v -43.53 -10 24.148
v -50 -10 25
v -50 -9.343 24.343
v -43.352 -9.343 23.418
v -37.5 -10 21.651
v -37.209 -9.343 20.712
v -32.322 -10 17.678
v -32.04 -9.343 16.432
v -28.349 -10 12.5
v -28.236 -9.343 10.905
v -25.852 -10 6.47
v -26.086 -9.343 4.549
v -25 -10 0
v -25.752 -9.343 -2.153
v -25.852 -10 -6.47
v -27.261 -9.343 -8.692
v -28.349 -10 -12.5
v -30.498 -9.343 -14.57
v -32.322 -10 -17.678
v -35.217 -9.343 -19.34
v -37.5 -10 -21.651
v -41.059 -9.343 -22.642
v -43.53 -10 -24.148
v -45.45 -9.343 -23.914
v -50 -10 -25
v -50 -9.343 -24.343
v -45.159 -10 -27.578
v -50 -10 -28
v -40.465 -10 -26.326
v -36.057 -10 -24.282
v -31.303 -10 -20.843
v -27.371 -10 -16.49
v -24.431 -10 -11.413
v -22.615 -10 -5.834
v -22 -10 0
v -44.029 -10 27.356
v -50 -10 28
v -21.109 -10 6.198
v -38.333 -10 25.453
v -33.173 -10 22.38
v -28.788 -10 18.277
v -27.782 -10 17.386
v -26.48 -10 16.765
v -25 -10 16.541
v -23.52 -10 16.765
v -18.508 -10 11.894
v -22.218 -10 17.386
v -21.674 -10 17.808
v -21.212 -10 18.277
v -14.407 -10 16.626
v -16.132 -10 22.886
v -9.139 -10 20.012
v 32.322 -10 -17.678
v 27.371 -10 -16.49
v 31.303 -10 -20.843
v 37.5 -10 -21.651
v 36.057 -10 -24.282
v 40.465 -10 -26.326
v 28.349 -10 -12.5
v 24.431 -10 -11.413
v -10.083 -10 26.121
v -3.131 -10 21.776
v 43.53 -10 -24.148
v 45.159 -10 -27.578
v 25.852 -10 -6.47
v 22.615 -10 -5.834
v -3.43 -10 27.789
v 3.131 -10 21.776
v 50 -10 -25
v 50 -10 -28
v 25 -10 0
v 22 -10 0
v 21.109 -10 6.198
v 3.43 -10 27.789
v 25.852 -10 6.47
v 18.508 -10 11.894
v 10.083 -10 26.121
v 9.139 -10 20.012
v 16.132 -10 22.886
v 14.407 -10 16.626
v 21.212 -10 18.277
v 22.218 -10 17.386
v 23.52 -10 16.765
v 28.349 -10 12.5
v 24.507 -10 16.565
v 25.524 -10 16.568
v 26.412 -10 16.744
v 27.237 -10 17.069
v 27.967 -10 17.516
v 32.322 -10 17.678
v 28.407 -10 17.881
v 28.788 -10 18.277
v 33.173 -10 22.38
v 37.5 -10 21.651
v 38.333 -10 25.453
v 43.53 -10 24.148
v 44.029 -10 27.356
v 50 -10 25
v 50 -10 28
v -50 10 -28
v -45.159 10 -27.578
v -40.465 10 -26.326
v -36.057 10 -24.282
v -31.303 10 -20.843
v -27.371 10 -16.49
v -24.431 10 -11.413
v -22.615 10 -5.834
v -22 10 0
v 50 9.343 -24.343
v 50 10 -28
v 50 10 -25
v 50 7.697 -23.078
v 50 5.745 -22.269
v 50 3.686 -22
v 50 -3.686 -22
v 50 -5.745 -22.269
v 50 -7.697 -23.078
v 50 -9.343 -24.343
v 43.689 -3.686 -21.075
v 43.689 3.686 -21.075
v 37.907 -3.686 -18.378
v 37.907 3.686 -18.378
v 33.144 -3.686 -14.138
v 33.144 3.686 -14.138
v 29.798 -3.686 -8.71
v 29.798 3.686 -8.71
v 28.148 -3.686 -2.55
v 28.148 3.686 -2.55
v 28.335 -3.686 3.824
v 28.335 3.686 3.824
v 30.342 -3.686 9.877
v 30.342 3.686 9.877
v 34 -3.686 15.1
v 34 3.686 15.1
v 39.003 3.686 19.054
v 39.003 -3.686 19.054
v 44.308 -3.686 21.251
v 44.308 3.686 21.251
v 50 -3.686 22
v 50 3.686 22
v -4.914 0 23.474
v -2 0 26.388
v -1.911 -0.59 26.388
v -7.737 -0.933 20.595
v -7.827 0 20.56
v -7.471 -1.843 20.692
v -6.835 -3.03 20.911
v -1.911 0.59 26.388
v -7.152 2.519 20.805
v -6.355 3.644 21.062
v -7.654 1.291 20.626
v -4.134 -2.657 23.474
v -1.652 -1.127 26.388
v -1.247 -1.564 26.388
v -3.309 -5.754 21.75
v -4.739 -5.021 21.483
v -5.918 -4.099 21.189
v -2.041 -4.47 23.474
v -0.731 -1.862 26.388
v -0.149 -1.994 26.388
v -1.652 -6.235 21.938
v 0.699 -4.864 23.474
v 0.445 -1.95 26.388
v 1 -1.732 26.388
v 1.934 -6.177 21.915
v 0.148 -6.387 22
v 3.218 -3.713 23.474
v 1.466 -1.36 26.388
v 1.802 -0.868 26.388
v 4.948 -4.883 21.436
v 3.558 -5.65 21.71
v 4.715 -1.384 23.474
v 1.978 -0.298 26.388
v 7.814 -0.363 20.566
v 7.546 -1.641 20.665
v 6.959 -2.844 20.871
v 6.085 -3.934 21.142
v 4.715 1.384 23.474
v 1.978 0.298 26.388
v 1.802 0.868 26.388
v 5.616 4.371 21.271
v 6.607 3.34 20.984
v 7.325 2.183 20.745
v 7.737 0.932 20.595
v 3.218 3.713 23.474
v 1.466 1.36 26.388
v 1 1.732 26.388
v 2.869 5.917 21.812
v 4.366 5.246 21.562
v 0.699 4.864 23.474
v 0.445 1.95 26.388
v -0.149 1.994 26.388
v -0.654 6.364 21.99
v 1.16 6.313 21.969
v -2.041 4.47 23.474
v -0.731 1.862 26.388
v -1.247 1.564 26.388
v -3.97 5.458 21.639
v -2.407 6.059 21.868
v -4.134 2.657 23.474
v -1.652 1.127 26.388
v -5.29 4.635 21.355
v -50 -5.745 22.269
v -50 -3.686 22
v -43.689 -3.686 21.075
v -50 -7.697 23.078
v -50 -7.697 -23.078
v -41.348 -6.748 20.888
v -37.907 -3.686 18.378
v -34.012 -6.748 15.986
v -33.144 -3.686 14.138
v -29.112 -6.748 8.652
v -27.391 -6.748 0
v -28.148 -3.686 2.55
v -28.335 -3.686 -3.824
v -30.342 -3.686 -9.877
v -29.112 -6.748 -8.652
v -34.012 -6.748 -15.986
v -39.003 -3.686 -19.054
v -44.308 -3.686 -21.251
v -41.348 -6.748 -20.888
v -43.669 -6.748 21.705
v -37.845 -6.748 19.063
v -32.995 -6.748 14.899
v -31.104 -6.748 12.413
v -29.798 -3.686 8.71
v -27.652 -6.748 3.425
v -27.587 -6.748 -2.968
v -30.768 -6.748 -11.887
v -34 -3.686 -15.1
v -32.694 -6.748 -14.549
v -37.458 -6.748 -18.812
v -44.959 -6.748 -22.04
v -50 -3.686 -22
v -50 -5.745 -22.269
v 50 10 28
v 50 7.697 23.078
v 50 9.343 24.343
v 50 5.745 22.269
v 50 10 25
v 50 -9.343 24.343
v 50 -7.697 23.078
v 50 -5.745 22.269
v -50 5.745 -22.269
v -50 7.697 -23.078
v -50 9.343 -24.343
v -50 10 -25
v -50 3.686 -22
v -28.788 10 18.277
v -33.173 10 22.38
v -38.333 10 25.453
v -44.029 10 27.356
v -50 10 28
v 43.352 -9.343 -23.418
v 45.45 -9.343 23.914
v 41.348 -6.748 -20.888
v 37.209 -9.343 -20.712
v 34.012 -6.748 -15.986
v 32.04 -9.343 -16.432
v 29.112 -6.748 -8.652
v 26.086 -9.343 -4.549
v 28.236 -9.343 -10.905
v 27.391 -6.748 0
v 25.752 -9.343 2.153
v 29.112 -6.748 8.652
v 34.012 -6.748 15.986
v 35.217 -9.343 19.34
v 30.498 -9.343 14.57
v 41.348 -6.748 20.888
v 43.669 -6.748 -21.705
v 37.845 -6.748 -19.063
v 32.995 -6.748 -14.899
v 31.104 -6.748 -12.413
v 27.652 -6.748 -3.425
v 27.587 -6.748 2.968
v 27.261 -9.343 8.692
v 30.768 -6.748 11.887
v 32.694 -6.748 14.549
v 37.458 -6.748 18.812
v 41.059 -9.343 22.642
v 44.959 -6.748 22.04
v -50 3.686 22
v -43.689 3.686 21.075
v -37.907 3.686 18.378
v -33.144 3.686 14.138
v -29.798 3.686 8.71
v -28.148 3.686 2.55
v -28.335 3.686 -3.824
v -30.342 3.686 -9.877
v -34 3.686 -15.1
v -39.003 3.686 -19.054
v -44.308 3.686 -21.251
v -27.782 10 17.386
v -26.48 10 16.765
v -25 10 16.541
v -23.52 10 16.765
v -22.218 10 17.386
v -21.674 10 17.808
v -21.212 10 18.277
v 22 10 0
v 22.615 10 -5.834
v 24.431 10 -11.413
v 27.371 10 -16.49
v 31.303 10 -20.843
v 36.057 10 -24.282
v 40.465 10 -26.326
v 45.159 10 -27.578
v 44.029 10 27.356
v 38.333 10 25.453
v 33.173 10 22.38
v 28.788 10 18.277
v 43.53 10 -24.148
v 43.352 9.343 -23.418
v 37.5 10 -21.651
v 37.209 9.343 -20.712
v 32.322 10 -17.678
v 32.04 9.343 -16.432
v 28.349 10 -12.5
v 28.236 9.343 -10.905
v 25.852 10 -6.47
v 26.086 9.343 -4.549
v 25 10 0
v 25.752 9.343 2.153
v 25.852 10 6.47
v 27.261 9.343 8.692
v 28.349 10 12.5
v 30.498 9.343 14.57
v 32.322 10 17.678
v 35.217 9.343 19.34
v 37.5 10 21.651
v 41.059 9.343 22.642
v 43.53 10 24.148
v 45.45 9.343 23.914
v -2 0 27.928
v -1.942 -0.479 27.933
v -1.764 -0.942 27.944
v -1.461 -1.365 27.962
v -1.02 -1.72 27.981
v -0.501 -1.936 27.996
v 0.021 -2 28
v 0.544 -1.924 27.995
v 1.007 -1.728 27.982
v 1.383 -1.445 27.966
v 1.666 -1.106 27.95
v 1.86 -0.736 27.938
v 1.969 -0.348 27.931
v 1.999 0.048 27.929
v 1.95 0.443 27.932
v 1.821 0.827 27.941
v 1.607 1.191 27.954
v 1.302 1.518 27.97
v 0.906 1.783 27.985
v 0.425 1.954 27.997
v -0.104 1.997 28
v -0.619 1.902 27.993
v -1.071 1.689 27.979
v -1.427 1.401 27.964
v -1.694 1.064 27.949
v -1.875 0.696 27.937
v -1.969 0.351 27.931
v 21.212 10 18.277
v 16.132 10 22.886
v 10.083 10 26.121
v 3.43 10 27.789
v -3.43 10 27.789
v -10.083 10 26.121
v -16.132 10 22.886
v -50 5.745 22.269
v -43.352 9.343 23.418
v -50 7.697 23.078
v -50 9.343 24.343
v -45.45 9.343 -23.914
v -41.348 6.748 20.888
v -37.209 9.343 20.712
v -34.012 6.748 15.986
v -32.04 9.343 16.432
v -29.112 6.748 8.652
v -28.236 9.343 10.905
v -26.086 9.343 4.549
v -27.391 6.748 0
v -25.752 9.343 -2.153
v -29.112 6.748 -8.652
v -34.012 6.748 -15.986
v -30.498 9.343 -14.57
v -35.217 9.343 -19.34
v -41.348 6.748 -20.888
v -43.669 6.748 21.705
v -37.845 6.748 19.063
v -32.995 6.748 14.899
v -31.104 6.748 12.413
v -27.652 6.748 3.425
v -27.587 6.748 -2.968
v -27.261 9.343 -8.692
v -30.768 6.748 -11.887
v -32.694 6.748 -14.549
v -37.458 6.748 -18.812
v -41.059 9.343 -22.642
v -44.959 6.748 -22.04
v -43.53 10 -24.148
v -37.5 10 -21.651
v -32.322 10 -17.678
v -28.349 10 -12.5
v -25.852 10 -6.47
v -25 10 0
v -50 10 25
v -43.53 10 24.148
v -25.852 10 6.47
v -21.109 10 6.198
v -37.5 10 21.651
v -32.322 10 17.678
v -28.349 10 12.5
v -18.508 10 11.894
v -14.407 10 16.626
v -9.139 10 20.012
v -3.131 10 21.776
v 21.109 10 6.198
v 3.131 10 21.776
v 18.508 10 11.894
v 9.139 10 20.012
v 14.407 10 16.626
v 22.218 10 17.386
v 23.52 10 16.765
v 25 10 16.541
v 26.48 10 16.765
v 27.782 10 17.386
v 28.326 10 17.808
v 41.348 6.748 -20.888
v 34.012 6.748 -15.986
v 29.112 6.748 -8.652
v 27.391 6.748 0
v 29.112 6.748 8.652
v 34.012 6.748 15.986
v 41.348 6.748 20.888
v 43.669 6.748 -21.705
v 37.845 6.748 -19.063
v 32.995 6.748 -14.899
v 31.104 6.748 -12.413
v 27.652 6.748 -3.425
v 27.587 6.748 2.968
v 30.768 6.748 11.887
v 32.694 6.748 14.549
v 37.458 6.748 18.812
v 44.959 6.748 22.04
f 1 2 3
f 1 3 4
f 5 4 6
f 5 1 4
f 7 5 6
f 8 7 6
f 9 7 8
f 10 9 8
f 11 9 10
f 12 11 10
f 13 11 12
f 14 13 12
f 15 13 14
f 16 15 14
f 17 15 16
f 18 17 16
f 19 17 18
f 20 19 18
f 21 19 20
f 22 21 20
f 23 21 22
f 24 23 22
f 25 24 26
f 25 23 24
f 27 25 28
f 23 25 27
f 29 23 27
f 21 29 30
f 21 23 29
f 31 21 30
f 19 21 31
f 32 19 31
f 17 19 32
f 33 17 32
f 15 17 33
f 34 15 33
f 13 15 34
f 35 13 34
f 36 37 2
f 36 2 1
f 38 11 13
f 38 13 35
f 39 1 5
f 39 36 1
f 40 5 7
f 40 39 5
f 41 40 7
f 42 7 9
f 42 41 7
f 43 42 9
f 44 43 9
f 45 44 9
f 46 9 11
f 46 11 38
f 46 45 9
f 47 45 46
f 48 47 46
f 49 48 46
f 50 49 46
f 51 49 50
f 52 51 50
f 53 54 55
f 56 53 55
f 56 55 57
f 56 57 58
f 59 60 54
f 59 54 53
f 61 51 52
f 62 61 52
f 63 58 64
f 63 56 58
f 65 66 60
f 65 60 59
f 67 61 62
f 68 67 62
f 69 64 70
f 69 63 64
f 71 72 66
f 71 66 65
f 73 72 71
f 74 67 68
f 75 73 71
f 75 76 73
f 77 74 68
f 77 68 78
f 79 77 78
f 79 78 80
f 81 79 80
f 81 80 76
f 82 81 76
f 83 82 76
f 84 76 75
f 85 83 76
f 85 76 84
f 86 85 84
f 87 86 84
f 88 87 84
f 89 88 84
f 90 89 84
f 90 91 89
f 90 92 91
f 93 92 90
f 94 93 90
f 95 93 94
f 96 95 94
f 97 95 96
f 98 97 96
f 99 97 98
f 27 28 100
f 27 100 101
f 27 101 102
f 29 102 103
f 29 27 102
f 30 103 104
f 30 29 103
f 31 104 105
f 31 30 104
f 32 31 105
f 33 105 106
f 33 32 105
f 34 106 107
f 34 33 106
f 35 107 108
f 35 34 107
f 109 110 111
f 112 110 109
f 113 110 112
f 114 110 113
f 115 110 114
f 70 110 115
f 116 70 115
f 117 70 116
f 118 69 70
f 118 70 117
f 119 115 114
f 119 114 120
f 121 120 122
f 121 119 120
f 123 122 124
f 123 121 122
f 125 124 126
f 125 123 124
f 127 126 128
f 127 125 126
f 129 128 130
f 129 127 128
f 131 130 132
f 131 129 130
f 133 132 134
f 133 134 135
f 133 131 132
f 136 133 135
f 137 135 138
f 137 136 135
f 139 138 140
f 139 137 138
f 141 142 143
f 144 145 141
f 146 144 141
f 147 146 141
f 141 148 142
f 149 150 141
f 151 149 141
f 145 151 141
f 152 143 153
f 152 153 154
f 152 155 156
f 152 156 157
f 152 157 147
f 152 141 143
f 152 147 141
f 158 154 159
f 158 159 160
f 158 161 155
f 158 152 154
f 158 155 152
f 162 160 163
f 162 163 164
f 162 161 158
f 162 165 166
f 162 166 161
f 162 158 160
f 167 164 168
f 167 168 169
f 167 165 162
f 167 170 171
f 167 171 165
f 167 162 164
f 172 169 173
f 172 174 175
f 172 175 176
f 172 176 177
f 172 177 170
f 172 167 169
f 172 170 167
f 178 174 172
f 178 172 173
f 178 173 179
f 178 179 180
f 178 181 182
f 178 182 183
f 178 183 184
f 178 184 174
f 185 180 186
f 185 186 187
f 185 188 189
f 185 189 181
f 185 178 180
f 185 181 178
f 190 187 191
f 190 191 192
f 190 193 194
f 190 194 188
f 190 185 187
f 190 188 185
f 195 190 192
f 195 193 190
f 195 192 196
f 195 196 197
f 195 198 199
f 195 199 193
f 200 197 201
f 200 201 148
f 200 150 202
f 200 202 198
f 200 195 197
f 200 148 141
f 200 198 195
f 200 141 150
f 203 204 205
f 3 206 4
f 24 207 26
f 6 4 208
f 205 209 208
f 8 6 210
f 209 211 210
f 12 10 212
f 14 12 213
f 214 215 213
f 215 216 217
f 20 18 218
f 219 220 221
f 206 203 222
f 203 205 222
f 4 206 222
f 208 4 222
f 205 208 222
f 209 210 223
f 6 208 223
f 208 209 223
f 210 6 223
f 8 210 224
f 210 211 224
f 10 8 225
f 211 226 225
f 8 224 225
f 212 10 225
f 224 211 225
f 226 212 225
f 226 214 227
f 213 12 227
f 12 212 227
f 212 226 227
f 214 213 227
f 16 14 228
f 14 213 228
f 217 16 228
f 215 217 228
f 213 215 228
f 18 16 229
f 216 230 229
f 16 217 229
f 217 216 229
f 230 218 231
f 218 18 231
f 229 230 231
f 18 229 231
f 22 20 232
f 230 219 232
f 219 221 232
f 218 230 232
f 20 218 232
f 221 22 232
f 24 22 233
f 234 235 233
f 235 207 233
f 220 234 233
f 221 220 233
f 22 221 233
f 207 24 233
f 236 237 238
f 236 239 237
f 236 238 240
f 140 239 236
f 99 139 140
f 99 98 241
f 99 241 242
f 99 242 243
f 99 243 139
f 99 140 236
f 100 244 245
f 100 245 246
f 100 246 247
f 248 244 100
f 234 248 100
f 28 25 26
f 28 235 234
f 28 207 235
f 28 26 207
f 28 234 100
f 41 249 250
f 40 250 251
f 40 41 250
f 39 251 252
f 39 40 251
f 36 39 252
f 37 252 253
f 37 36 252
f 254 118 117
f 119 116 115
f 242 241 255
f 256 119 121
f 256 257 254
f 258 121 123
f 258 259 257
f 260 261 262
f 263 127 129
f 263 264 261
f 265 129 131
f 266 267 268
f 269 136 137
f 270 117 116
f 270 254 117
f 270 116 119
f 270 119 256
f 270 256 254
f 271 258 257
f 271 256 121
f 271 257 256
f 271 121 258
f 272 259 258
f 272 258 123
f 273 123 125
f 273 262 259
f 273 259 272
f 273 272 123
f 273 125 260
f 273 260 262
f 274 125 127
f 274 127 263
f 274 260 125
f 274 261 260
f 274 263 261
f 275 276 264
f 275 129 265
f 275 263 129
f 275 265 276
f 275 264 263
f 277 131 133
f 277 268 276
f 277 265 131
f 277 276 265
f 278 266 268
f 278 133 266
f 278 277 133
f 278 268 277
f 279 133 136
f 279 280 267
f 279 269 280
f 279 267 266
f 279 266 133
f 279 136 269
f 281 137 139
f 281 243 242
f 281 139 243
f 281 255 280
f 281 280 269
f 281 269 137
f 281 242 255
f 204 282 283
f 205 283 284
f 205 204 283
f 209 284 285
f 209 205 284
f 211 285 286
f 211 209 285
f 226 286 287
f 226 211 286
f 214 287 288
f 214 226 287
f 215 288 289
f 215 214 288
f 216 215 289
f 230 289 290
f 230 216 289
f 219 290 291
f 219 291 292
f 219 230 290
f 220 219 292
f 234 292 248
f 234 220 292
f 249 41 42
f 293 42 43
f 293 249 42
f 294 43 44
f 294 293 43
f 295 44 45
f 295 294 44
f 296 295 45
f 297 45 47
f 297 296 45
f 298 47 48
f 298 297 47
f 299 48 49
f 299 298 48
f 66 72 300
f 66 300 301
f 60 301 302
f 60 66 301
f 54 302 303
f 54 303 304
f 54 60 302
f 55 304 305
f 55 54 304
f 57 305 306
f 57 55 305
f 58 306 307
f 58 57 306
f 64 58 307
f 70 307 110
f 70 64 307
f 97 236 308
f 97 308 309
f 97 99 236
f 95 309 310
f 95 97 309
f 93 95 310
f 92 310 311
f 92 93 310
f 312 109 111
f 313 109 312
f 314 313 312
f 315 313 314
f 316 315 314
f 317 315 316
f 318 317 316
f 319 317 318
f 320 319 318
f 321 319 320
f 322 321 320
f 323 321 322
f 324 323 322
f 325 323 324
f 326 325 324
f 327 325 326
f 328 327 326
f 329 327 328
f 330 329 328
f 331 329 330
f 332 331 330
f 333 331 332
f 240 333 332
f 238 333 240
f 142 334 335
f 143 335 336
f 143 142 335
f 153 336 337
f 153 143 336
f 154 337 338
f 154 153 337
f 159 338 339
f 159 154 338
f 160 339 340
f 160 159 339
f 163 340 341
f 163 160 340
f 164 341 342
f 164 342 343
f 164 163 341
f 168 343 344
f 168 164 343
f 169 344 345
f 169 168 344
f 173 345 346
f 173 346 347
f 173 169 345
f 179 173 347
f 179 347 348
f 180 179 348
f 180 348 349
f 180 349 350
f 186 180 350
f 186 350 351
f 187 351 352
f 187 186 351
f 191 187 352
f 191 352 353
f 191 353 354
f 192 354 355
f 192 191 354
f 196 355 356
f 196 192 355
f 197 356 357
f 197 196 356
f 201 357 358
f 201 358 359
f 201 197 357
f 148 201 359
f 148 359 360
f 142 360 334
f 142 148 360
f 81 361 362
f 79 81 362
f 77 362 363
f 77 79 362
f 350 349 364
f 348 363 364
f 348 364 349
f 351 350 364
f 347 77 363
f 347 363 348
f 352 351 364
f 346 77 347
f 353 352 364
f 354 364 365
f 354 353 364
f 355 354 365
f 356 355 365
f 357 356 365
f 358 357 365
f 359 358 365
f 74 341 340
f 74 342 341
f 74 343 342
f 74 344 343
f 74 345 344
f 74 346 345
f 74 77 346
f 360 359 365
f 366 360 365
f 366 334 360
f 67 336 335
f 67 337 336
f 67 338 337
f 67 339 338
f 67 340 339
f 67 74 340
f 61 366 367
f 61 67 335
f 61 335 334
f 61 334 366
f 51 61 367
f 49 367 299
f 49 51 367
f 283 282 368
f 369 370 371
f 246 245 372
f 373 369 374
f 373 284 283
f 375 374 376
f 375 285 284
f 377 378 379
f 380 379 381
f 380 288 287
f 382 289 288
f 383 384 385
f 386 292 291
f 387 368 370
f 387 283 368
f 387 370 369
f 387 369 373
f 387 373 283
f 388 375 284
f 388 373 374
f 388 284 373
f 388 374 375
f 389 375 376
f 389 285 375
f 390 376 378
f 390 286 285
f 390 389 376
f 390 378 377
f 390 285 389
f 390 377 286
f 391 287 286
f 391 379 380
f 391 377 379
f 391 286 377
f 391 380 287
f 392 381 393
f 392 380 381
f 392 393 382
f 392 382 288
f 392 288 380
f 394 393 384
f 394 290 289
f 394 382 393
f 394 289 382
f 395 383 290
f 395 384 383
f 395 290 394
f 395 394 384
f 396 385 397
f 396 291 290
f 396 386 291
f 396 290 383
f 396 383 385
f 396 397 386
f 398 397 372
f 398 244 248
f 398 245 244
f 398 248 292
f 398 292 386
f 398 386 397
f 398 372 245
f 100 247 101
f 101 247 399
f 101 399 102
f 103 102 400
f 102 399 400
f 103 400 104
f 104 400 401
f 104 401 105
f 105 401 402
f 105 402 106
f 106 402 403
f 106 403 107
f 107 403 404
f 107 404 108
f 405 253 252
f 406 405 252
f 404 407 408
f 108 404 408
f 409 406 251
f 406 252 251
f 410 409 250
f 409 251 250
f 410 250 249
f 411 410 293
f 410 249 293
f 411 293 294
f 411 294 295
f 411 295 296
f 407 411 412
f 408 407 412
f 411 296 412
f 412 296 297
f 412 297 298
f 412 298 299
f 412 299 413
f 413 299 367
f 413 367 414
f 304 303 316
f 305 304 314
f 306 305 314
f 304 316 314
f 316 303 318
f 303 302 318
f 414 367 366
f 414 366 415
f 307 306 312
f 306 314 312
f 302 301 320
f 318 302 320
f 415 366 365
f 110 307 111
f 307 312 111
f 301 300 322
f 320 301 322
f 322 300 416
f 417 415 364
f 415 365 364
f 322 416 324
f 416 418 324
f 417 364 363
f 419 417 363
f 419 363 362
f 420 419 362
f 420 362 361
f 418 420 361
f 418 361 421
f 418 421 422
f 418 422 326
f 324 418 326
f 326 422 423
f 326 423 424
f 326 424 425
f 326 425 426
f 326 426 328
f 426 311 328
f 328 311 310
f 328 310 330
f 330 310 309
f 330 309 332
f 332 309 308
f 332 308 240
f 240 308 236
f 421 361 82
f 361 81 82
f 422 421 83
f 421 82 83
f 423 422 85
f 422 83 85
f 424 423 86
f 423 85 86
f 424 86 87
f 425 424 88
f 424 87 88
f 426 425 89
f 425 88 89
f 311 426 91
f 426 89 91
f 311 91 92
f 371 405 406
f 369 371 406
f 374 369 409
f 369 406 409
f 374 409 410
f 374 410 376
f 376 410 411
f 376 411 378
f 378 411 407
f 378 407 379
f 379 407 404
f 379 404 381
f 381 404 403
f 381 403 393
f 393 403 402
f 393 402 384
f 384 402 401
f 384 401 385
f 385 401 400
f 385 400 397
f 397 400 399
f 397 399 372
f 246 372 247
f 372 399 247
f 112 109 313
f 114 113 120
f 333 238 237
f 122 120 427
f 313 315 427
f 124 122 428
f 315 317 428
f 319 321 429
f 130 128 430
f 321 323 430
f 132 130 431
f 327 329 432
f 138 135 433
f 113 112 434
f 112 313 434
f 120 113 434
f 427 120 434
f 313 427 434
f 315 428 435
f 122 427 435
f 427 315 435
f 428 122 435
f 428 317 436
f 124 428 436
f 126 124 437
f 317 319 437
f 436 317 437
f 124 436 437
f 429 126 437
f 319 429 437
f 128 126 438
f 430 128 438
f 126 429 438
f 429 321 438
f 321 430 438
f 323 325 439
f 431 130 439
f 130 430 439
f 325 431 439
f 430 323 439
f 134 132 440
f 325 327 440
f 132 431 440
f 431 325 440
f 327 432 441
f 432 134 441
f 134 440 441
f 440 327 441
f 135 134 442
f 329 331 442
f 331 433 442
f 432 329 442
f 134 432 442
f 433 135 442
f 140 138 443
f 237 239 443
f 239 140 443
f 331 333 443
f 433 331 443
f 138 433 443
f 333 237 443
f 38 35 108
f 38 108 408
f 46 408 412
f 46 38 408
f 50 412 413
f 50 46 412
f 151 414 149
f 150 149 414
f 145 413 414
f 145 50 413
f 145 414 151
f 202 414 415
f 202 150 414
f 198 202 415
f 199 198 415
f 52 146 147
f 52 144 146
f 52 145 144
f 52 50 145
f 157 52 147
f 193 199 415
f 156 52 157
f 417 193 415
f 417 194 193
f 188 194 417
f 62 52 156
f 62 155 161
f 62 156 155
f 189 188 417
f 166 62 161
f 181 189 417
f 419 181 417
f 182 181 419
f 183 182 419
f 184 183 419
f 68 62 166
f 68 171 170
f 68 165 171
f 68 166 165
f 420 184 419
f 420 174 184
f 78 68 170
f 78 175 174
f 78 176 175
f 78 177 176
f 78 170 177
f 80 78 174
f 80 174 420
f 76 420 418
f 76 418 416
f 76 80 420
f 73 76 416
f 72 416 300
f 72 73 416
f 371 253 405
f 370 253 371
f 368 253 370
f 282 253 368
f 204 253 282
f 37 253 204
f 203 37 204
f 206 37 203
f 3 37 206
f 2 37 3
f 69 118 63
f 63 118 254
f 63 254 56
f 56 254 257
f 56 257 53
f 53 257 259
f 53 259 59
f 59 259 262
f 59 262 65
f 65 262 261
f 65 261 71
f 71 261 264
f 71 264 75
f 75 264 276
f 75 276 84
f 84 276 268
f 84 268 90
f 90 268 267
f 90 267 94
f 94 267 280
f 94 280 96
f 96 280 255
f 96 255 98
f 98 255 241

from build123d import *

# Parameters (mm, degrees)
F1_DEPTH = 10
F4_SIZE  = 3
F5_R     = 8
F6_R     = 5


with BuildPart() as f1:
    # F0 (on Front) → F1 (new body, symmetric)
    with BuildSketch(Plane.XZ):
        with BuildLine():
            ThreePointArc((-50, 22), (-28, 0), (-50, -22))
            Line((-50, -22), (-50, -28))
            ThreePointArc((-50, -28), (-42.7848180337, -27.0544109009), (-36.0569644542, -24.2815106566))
            ThreePointArc((-36.0569644542, -24.2815106566), (-25.7677384951, -14.0284533131), (-22, 0))
            ThreePointArc((-22, 0), (0, 22), (22, 0))
            ThreePointArc((22, 0), (25.7677384951, -14.0284533131), (36.0569644542, -24.2815106566))
            ThreePointArc((36.0569644542, -24.2815106566), (42.7848180337, -27.0544109009), (50, -28))
            Line((50, -28), (50, -22))
            ThreePointArc((50, -22), (28, 0), (50, 22))
            Line((50, 22), (50, 28))
            ThreePointArc((50, 28), (35.3212154107, 23.8439359792), (25, 12.6095202129))
            ThreePointArc((25, 12.6095202129), (0, 28), (-25, 12.6095202129))
            ThreePointArc((-25, 12.6095202129), (-35.3212154107, 23.8439359792), (-50, 28))
            Line((-50, 28), (-50, 22))
        make_face()
    extrude(amount=F1_DEPTH, both=True)

    # F2 (on Front) → F3 (revolve, cut)
    with BuildSketch(Plane.XZ):
        Polygon((0, 31.6328920043), (-2, 31.6328920043), (-2, 26.3877877519), (-8.5819354281, 19.8058523238), (0, 19.8058523238), align=None)
    revolve(axis=Axis((0, 0, 16.2401215483), (0, 0, 1)), mode=Mode.SUBTRACT)

    # F4
    f4_edges = [f1.edges().sort_by_distance(p)[0] for p in [
        (-28, 10, 0),
        (-28, -10, 0),
        (28, 10, 0),
        (28, -10, 0),
    ]]
    chamfer(f4_edges, length=F4_SIZE)

    # F5
    f5_edges = [f1.edges().sort_by_distance(p)[0] for p in [
        (-28, 7, 0),
        (-28, -7, 0),
        (28, 7, 0),
        (28, -7, 0),
    ]]
    fillet(f5_edges, radius=F5_R)

    # F6
    f6_edges = [f1.edges().sort_by_distance(p)[0] for p in [
        (25, 0, 12.60952),
        (-25, 0, 12.60952),
    ]]
    fillet(f6_edges, radius=F6_R)


solid = f1.part
